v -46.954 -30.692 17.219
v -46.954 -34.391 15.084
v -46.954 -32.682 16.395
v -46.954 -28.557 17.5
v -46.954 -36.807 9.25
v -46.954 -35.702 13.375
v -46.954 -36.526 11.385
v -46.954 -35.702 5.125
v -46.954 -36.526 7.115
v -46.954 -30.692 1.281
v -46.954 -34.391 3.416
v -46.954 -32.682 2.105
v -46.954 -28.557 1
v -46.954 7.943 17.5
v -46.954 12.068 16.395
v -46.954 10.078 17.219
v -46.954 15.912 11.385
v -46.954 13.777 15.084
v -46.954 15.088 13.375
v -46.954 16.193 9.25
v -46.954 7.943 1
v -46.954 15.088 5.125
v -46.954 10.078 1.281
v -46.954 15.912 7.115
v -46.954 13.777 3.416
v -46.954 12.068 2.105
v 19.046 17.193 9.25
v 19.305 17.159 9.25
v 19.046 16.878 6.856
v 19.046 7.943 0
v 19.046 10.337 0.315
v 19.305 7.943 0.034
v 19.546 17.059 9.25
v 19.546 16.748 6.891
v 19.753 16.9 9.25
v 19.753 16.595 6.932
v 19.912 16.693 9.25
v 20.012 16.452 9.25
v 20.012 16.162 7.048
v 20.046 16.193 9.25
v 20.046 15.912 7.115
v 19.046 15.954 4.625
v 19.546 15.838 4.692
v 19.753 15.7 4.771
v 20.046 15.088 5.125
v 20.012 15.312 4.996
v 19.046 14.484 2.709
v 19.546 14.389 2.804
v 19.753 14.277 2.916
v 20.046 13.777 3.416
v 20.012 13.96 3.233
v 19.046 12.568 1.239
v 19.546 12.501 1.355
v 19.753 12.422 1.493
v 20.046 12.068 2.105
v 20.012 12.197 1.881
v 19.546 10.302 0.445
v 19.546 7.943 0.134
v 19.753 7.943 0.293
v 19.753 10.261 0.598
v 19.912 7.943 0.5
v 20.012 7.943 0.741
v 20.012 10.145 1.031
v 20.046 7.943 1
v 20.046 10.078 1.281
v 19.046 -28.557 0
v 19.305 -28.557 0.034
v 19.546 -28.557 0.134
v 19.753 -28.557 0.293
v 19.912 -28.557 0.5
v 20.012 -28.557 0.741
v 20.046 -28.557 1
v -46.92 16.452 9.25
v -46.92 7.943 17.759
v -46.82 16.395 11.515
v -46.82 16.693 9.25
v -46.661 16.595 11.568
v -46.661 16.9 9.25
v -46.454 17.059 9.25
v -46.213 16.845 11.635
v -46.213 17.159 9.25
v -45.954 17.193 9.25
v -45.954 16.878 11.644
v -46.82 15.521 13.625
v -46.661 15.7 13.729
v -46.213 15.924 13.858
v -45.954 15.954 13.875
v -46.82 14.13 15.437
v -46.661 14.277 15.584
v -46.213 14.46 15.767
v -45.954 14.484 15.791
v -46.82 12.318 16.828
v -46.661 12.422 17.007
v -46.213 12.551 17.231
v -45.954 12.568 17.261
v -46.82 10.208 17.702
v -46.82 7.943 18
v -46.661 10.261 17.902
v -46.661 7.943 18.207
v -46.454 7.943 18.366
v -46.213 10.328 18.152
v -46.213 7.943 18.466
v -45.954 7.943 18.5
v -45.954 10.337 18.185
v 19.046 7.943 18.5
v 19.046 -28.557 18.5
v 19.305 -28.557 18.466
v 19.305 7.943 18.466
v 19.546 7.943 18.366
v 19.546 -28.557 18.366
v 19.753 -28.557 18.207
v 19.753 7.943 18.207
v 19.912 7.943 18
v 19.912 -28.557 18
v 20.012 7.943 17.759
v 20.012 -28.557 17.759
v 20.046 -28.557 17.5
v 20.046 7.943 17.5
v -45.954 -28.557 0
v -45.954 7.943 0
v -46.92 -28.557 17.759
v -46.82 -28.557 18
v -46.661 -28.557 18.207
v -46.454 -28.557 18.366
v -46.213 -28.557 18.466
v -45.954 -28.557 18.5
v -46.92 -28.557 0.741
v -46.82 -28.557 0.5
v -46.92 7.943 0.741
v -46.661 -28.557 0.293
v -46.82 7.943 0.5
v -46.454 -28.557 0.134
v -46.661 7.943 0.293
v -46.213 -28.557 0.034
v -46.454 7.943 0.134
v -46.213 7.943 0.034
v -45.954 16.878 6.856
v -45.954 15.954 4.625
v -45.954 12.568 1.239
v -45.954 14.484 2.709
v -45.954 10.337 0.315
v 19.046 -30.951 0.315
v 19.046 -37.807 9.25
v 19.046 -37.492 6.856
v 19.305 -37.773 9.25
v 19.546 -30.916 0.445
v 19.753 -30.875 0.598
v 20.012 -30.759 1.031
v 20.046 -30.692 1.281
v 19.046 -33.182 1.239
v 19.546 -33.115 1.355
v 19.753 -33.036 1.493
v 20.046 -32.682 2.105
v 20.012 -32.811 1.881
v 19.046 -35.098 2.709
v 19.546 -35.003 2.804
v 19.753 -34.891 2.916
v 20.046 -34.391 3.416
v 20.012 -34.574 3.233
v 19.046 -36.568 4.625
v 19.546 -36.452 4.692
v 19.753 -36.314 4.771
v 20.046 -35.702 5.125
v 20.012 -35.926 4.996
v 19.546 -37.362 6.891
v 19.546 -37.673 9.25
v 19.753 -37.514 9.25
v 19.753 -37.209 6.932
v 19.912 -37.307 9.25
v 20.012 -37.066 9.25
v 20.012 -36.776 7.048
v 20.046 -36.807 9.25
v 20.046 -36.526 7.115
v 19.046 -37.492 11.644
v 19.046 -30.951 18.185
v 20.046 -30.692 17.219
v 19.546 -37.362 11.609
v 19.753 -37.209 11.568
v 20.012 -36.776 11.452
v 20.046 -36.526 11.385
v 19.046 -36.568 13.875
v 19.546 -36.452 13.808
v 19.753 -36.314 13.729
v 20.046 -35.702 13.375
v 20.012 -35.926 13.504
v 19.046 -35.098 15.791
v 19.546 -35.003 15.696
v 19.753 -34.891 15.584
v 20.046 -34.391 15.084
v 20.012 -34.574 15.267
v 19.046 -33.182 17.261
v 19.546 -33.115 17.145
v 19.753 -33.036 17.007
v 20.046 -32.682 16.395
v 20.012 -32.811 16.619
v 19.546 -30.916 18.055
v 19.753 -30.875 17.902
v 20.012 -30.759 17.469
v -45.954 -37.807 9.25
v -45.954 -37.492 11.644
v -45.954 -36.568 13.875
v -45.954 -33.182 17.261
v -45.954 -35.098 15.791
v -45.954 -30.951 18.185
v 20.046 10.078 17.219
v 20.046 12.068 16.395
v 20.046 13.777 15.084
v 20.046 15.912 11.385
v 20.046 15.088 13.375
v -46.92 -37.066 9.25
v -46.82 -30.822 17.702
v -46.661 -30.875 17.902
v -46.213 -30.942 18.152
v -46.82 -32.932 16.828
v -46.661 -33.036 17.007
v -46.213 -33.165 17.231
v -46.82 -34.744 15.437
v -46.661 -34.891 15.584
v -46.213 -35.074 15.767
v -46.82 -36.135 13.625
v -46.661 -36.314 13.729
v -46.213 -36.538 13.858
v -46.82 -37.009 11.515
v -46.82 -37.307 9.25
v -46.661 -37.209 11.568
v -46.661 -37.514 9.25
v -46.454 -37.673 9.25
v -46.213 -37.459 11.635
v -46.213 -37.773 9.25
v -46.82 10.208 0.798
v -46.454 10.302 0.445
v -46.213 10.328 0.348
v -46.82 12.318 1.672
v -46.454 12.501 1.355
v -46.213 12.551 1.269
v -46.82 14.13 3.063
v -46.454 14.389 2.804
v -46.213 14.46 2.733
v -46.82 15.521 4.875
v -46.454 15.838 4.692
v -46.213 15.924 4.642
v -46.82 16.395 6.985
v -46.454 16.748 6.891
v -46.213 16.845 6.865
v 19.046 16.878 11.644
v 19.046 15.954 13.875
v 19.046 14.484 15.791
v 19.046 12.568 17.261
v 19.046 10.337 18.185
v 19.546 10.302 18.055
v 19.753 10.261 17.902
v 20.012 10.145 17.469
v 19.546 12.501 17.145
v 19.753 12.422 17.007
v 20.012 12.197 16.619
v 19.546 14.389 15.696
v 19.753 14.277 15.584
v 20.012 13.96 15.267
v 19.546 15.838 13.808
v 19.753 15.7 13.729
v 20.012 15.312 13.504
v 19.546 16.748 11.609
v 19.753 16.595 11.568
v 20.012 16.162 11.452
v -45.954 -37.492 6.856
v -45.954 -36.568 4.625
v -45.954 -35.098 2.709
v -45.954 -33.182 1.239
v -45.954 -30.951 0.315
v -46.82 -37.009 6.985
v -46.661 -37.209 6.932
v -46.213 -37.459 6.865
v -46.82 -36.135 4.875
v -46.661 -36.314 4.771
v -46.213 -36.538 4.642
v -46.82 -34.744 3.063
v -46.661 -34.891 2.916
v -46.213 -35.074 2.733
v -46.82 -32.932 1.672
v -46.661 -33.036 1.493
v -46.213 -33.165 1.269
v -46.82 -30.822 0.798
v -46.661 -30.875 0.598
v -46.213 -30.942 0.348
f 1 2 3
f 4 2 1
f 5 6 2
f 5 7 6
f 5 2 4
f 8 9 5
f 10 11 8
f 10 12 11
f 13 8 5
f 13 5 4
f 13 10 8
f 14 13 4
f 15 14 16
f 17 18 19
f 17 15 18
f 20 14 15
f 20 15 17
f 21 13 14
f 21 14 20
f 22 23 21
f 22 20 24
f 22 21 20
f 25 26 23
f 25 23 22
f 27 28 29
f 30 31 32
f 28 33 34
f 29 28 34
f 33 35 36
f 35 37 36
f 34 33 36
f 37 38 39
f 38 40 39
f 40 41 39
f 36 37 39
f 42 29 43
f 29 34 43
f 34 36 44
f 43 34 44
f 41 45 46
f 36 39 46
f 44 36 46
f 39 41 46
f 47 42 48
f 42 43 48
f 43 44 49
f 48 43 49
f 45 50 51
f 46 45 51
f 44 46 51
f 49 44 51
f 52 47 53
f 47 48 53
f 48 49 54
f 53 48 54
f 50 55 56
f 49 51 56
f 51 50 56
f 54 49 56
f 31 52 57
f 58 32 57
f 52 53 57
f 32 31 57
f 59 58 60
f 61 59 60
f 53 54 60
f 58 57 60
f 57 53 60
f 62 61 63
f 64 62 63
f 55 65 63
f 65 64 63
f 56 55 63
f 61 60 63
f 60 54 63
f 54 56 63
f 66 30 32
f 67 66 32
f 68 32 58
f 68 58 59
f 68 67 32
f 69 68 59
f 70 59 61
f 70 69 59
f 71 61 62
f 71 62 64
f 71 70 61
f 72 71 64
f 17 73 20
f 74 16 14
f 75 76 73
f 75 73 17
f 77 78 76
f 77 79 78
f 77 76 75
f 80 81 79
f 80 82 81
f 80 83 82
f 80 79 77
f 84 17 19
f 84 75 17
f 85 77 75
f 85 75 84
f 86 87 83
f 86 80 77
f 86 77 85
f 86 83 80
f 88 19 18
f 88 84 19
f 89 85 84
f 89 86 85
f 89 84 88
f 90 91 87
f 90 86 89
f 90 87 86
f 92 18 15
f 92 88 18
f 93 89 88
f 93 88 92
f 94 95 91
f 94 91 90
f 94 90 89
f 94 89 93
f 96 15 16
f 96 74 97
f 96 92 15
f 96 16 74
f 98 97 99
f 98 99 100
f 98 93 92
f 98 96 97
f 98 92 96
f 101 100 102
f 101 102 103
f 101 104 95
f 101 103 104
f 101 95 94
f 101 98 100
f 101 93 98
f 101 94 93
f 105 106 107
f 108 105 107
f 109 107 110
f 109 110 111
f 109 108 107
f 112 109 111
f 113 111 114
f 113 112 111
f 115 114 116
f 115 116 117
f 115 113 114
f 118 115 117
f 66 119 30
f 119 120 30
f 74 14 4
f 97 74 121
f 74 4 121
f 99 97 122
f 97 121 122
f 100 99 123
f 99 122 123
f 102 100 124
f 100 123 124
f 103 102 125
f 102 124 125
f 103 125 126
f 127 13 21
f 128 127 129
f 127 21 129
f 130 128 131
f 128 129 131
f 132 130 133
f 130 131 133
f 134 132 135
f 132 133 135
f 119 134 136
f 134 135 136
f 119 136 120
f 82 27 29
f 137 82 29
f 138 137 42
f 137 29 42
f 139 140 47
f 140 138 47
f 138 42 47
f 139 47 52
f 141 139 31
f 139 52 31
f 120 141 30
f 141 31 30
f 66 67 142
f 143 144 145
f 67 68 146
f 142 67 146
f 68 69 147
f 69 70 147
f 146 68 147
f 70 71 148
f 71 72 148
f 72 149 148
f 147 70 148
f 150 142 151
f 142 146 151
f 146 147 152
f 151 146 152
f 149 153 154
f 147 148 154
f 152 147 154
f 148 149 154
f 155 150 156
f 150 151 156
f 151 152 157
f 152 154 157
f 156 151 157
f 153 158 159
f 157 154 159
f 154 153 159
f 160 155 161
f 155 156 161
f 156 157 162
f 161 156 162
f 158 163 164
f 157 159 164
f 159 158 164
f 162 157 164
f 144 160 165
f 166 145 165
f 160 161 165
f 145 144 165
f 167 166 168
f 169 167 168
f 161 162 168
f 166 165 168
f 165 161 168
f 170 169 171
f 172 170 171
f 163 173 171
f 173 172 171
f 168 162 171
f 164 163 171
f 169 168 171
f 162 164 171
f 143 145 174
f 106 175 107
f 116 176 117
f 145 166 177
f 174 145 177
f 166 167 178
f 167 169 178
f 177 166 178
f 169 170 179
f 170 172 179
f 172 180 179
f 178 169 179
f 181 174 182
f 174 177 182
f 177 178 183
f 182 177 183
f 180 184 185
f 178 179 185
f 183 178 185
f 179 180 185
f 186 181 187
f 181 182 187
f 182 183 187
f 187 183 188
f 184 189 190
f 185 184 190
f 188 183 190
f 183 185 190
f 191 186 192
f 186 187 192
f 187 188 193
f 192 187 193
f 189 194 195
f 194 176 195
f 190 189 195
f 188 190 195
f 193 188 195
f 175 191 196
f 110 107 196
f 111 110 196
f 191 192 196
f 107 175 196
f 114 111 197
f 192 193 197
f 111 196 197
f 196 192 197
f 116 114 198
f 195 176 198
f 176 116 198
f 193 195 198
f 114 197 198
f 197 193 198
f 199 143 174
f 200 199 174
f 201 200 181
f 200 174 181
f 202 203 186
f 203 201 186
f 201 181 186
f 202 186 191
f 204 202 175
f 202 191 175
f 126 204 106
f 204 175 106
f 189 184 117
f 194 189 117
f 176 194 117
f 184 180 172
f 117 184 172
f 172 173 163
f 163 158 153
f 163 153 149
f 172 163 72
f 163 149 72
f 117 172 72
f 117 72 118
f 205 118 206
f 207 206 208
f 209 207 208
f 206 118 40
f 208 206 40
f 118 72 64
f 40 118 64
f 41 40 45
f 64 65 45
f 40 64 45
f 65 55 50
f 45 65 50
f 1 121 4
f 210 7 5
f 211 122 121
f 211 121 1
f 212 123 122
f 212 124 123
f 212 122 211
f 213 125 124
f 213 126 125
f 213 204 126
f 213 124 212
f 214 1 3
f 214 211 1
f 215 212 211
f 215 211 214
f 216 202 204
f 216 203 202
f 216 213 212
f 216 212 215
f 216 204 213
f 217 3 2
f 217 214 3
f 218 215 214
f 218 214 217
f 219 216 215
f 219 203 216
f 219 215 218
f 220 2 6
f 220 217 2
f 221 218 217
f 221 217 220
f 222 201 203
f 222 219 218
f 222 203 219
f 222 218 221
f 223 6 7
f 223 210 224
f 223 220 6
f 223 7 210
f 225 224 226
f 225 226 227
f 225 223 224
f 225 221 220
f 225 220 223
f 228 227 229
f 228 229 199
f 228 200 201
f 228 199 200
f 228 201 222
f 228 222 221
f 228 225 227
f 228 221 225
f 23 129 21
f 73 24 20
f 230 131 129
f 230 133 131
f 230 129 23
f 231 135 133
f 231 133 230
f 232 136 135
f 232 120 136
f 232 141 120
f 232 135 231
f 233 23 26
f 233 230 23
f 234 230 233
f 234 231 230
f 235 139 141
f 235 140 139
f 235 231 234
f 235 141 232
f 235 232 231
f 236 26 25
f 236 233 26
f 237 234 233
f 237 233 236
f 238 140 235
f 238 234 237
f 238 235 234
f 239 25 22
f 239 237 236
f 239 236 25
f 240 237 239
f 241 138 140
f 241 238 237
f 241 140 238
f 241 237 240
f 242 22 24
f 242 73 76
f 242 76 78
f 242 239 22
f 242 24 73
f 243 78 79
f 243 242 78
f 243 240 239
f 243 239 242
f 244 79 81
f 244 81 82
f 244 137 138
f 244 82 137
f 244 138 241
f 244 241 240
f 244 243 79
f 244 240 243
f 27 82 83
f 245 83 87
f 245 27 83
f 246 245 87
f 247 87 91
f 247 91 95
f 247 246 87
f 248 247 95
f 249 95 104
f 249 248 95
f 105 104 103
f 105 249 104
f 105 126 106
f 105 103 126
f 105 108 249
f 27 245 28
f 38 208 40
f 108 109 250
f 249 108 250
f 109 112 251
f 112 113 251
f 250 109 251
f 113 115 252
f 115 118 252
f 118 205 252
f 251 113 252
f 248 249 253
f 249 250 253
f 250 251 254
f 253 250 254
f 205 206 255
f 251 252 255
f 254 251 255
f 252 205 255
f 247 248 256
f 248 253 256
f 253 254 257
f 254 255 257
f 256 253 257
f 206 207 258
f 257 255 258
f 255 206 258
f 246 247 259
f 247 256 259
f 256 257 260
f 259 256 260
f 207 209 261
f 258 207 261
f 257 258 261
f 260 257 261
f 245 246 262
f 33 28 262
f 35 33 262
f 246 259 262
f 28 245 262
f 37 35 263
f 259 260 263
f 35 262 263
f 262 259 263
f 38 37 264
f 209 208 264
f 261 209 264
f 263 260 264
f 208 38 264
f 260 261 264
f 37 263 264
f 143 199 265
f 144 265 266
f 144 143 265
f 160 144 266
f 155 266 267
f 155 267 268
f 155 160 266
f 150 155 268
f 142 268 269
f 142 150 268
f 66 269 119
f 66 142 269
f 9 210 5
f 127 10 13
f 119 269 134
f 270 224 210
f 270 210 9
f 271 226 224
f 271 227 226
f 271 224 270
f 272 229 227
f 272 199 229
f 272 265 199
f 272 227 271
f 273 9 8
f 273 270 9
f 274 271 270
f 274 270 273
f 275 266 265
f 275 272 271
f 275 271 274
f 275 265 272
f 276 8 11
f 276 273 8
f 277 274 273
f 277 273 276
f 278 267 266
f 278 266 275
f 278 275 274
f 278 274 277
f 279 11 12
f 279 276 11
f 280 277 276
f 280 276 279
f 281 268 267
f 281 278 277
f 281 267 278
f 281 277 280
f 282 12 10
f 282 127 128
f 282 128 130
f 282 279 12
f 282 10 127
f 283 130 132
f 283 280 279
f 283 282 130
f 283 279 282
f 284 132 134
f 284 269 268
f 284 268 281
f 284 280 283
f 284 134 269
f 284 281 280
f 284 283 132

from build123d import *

# Parameters (mm, degrees)
F1_W     = 67
F1_H     = 55
F2_DEPTH = 18.5
F3_R     = 9.24999
F4_R     = 1


# Not quite as in the source:
# - a fillet or chamfer is up to 0.001 mm smaller than in the source, because OpenCascade refuses the exact size


with BuildPart() as f2:
    # F1 (on Top) → F2 (new body)
    with BuildSketch(Plane.XY):
        with Locations((-13.4538196921, -10.3069728613)):
            Rectangle(F1_W, F1_H)
    extrude(amount=F2_DEPTH)

    # F3 (radius 9.25 in the source; OpenCascade refuses exactly that, so slightly less here)
    f3_edges = [f2.edges().sort_by_distance(p)[0] for p in [
        (-13.45382, 17.193027, 18.5),
        (-13.45382, 17.193027, 0),
        (-13.45382, -37.806973, 18.5),
        (-13.45382, -37.806973, 0),
    ]]
    fillet(f3_edges, radius=F3_R)

    # F4
    f4_edges = [f2.edges().sort_by_distance(p)[0] for p in [
        (20.04618, -37.806973, 9.25),
        (20.04618, -35.097714, 2.709259),
        (20.04618, -35.097714, 15.790741),
        (20.04618, -10.306973, 0),
        (20.04618, -10.306973, 18.5),
        (20.04618, 14.483768, 2.709259),
        (20.04618, 14.483768, 15.790741),
        (20.04618, 17.193027, 9.25),
        (-46.95382, 17.193027, 9.25),
        (-46.95382, 14.483768, 2.709259),
        (-46.95382, 14.483768, 15.790741),
        (-46.95382, -10.306973, 0),
        (-46.95382, -10.306973, 18.5),
        (-46.95382, -35.097714, 2.709259),
        (-46.95382, -35.097714, 15.790741),
        (-46.95382, -37.806973, 9.25),
    ]]
    fillet(f4_edges, radius=F4_R)


solid = f2.part
